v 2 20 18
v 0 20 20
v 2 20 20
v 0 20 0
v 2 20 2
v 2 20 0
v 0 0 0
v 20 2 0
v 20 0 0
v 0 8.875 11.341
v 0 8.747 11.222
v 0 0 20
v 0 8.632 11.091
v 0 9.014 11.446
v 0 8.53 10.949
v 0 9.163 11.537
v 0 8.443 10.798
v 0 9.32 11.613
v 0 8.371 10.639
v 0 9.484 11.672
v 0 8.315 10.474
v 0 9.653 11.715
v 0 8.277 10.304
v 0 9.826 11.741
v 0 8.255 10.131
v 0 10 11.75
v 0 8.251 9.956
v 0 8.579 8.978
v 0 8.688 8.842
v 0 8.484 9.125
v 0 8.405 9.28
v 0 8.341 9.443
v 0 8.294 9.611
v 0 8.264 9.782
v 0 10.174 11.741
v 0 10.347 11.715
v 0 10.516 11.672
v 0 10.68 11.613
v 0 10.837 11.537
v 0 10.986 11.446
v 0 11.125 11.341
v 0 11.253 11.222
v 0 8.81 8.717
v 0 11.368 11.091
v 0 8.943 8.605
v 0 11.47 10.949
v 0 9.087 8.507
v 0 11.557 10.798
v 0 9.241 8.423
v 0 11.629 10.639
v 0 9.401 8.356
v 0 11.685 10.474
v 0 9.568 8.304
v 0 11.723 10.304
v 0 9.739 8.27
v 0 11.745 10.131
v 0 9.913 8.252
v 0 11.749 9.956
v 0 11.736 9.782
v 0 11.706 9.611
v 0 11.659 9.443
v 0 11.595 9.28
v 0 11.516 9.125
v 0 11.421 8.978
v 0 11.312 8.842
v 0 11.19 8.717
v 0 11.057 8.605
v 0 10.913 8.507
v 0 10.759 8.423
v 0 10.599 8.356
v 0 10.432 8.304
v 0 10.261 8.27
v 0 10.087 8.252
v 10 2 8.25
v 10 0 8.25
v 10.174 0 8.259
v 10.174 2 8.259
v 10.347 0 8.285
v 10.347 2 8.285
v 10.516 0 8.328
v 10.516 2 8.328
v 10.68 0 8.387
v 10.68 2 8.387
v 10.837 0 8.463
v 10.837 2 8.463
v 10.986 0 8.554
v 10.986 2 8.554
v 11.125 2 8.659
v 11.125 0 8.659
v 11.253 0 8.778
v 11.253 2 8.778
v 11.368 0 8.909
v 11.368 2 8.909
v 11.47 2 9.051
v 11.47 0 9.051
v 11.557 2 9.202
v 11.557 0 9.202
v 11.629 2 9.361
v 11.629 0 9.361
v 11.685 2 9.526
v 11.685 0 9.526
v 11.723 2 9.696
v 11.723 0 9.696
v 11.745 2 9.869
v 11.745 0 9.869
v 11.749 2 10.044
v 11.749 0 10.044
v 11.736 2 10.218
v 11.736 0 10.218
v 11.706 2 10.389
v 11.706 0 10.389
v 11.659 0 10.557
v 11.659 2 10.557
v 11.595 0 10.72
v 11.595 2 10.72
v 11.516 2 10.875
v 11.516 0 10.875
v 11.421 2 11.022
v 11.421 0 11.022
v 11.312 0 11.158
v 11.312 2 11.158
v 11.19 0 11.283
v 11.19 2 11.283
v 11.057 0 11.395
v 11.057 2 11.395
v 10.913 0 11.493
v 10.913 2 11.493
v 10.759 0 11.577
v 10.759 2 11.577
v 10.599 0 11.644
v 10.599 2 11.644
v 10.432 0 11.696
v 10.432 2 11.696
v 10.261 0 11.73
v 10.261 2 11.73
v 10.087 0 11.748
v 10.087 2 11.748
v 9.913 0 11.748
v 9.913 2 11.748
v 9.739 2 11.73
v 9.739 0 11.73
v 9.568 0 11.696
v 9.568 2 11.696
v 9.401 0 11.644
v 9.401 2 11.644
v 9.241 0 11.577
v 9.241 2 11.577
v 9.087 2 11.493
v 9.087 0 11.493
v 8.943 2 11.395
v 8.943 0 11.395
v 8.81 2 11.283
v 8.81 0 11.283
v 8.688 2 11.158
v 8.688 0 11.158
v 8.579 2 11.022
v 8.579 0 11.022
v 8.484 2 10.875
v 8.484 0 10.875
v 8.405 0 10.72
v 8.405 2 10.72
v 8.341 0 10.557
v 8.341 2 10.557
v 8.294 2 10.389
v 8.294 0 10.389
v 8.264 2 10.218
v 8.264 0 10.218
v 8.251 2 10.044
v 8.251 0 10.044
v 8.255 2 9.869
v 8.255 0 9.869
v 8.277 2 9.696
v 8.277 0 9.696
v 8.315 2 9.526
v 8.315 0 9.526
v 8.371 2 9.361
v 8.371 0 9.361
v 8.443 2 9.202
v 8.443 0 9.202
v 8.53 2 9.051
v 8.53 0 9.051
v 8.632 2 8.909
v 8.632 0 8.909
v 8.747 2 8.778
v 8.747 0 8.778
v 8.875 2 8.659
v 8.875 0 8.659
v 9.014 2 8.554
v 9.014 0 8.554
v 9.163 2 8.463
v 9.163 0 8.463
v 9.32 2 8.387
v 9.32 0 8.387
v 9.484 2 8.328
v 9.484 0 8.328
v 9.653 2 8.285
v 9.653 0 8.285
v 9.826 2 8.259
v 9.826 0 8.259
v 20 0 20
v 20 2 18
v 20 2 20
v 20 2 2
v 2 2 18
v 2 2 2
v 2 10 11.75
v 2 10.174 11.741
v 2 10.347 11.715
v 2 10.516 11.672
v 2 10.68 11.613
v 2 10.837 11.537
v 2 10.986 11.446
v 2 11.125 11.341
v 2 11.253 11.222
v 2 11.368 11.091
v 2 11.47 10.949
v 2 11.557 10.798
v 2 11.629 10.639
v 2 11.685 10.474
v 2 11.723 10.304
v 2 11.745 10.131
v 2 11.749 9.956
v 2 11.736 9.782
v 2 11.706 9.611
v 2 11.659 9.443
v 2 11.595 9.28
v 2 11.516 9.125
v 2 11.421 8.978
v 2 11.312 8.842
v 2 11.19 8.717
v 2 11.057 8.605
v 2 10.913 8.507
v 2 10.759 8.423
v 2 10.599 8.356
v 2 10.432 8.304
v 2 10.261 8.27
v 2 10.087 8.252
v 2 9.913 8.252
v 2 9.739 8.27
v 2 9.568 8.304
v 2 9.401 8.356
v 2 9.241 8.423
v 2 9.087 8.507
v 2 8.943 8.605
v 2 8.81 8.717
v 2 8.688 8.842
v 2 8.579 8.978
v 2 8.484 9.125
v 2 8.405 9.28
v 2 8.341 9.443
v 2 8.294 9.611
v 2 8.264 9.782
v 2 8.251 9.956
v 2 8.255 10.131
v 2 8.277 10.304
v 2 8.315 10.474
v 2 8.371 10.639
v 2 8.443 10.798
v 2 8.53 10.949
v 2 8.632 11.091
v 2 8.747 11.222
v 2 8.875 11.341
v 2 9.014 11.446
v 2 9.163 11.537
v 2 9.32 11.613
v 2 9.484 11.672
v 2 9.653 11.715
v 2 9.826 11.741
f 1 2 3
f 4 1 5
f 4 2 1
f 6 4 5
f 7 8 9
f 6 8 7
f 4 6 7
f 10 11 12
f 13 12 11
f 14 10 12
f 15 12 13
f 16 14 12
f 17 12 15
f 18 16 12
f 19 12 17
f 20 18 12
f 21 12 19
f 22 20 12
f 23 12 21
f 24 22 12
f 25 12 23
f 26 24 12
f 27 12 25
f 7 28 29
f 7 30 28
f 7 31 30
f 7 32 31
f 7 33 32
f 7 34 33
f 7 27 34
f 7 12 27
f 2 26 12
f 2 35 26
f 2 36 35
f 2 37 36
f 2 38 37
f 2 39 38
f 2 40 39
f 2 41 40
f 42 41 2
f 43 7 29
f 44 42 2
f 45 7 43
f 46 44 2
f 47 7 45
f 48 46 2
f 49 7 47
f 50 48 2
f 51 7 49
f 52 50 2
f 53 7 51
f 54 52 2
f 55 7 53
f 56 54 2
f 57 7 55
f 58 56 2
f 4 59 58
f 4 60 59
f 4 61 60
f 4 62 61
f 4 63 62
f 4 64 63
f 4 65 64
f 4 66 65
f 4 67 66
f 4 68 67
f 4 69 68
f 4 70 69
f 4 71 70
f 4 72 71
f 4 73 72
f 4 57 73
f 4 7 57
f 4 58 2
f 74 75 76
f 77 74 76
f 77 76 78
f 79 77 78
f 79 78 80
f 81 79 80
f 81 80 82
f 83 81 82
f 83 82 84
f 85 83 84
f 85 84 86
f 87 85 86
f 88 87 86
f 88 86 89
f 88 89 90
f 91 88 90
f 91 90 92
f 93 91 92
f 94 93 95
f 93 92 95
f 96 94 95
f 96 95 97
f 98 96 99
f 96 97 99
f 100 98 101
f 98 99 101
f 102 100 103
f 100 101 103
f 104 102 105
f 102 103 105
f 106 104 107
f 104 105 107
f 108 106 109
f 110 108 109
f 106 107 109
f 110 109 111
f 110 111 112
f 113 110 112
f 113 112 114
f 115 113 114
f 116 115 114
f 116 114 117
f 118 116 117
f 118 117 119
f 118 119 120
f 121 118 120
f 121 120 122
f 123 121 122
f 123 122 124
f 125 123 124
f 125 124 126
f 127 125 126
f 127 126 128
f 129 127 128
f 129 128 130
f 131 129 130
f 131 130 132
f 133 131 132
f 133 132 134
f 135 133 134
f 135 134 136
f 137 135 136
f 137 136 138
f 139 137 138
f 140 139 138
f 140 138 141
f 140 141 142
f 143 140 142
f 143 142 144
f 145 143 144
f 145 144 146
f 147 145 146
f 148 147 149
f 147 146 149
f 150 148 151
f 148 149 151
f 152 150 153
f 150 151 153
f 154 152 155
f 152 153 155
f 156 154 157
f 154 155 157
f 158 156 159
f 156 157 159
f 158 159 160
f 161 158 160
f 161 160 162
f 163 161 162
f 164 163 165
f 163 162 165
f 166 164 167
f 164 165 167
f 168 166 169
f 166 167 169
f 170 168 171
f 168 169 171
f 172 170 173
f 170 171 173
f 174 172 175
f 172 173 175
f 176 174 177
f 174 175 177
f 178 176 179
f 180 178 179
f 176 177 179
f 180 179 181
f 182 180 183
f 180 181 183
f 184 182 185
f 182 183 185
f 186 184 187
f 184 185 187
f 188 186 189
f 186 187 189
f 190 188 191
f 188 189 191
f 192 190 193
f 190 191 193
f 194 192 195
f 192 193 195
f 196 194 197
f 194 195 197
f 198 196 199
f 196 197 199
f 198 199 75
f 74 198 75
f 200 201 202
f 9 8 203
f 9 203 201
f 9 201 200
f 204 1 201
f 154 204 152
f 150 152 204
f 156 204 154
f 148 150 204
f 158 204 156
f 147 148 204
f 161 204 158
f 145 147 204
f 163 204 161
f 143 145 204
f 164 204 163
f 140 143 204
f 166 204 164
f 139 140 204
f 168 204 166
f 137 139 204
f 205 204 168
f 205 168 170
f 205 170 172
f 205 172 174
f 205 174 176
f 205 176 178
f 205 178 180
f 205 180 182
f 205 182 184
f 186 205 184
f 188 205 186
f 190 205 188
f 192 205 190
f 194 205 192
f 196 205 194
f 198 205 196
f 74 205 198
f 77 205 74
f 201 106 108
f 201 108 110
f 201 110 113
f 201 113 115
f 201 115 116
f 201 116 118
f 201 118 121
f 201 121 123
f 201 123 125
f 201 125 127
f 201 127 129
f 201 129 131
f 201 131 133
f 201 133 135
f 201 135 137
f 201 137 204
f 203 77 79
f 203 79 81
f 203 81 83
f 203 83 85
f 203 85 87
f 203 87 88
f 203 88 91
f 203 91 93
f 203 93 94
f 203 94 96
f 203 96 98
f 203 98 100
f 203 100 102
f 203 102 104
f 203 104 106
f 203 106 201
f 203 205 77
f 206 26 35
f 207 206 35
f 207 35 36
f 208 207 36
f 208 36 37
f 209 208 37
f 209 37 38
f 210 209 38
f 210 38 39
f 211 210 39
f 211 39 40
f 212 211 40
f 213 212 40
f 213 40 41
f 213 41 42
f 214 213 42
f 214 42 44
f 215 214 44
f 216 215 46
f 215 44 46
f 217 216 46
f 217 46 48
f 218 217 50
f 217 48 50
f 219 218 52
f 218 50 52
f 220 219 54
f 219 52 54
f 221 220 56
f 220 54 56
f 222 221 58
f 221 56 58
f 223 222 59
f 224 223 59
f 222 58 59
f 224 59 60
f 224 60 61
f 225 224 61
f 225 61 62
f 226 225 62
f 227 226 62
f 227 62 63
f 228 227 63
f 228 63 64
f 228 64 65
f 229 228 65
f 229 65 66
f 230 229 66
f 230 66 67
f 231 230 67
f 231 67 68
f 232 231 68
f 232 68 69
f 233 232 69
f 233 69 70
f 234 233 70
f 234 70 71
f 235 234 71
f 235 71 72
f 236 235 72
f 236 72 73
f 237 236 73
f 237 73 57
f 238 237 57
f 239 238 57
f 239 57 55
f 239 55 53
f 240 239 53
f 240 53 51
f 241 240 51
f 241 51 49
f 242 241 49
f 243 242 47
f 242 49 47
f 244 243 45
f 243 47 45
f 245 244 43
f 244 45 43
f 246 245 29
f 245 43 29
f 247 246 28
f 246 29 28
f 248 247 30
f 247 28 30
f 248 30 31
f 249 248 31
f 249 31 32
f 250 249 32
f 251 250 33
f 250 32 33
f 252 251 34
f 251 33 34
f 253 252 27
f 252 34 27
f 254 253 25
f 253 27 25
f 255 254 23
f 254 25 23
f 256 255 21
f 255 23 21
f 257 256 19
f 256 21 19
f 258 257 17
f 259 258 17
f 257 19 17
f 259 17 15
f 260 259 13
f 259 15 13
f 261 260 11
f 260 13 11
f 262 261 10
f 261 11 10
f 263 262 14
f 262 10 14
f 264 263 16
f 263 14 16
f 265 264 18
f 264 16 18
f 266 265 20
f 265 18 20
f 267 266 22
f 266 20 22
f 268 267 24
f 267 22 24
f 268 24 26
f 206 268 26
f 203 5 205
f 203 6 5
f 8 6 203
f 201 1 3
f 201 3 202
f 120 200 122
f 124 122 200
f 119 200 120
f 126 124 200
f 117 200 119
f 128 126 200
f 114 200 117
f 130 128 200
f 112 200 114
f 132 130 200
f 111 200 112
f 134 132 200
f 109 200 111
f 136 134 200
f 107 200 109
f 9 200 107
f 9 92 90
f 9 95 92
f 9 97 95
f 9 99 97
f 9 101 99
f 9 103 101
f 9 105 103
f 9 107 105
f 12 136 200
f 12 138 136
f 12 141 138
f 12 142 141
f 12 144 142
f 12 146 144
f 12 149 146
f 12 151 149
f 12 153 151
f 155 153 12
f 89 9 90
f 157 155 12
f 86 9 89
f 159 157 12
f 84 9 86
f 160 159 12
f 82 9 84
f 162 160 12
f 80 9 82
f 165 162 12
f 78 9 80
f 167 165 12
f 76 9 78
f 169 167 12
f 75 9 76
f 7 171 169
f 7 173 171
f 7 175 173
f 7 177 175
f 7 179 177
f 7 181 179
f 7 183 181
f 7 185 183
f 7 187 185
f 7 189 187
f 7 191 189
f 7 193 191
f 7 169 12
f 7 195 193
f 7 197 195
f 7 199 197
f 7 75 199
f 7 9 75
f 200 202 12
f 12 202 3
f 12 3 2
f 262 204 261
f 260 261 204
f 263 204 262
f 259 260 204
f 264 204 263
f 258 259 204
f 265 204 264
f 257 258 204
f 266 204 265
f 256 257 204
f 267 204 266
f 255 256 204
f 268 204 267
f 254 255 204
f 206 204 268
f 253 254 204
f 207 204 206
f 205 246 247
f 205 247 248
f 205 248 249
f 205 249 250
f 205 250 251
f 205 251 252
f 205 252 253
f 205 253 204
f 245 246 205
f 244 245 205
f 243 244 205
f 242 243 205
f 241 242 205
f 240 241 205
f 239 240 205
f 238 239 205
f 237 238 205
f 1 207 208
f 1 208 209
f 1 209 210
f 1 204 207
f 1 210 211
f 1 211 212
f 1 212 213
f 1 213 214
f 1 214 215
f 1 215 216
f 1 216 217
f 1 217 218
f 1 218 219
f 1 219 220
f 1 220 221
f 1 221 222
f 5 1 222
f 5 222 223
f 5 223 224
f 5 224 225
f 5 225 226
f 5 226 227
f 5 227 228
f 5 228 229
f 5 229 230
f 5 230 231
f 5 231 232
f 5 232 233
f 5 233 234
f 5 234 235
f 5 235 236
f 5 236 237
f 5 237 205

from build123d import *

# Parameters (mm, degrees)
EXTRUDE_1_DEPTH     = 20
SKETCH_2_W          = 18
SKETCH_2_H          = 16
CUT_EXTRUDE_1_DEPTH = 18
SKETCH_3_R          = 1.75
CUT_EXTRUDE_2_DEPTH = 18
SKETCH_4_R          = 1.75
CUT_EXTRUDE_3_DEPTH = 18


with BuildPart() as part:
    # 草图1 → 凸台-拉伸1 (new body)
    with BuildSketch(Plane.XY):
        Polygon((2, 20), (20, 2), (20, 0), (0, 0), (0, 20), align=None)
    extrude(amount=EXTRUDE_1_DEPTH)

    # 草图2 → 切除-拉伸1 (cut)
    with BuildSketch(Plane(origin=(0, 20, 0), x_dir=(1, 0, 0), z_dir=(0, 1, 0))):
        with Locations((11, -10)):
            Rectangle(SKETCH_2_W, SKETCH_2_H)
    extrude(amount=-CUT_EXTRUDE_1_DEPTH, mode=Mode.SUBTRACT)

    # 草图3 → 切除-拉伸2 (cut)
    with BuildSketch(Plane.XZ):
        with Locations(Location((10, 10, 0), (0, 0, 270))):
            Circle(SKETCH_3_R)
    extrude(amount=-CUT_EXTRUDE_2_DEPTH, mode=Mode.SUBTRACT)

    # 草图4 → 切除-拉伸3 (cut)
    with BuildSketch(Plane.ZY):
        with Locations((10, 10)):
            Circle(SKETCH_4_R)
    extrude(amount=-CUT_EXTRUDE_3_DEPTH, mode=Mode.SUBTRACT)


solid = part.part
